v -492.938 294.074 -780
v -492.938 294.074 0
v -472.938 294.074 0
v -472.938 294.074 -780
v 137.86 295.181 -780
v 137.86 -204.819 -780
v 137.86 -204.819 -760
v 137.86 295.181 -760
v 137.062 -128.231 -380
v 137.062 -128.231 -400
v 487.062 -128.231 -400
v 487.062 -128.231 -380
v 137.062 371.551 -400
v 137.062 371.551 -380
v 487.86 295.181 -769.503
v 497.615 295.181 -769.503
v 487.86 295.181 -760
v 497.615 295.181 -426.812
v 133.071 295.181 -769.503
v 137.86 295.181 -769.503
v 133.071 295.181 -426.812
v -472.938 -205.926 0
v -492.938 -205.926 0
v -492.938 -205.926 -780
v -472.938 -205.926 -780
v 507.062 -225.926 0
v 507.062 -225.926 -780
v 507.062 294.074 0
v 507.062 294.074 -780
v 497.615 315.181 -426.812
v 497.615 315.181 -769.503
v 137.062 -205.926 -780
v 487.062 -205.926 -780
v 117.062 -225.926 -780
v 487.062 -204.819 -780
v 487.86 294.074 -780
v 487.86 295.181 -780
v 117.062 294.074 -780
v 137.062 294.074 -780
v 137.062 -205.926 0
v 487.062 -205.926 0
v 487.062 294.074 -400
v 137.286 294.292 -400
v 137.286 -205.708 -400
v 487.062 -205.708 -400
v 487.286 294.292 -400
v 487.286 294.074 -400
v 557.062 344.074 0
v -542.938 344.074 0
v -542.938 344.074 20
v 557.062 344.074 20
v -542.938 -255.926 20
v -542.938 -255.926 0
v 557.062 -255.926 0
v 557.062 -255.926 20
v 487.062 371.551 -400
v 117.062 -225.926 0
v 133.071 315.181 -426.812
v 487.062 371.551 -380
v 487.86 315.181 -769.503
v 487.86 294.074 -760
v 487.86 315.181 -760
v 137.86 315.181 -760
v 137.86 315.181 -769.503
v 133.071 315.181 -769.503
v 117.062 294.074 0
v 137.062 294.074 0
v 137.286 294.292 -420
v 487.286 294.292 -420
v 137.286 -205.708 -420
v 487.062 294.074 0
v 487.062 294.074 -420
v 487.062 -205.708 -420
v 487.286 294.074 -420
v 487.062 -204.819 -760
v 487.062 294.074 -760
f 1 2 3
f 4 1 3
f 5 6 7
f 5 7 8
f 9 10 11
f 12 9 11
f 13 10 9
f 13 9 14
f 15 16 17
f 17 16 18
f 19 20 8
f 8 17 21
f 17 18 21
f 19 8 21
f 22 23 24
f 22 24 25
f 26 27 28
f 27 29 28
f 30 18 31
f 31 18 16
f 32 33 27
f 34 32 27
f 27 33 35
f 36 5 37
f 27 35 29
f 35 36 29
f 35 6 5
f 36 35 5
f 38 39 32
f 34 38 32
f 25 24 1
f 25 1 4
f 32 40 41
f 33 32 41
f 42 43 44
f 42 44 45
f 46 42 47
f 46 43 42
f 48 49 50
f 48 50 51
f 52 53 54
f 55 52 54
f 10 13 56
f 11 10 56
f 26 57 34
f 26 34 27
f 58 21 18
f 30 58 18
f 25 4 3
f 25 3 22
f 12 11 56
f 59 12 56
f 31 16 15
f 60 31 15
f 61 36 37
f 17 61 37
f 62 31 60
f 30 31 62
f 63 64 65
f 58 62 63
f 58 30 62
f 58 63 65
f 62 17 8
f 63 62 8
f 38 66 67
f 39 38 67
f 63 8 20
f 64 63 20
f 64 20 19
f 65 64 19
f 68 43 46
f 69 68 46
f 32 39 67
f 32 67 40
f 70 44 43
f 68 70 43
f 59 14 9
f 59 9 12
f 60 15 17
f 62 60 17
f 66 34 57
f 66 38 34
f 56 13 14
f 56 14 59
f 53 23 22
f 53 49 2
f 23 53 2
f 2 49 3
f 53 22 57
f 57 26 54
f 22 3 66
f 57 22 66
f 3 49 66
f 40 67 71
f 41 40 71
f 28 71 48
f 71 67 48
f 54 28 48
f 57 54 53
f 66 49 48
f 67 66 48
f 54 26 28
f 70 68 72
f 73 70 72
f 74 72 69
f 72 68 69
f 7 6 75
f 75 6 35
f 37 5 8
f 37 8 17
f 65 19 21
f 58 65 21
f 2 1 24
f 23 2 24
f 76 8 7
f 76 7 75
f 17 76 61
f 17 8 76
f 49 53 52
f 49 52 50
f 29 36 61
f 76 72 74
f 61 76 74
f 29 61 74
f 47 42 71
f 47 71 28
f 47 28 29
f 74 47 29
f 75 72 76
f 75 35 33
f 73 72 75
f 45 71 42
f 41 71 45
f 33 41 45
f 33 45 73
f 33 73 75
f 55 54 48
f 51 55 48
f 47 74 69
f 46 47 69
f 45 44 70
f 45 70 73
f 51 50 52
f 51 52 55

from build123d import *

# Parameters (mm, degrees)
F0_W      = 1100
F0_H      = 600
F1_DEPTH  = 20
F2_W      = 20
F2_H      = 500
F3_DEPTH  = 780
F4_W      = 390
F4_H      = 780
F5_DEPTH  = 20
F7_W      = 350
F7_H      = 500
F8_DEPTH  = 20
F10_W     = 350
F10_H     = 499.781407
F11_DEPTH = 20
F12_W     = 350
F12_H     = 500
F13_DEPTH = 20
F15_DEPTH = 20


with BuildPart() as f1:
    # F0 (on Top) → F1 (new body)
    with BuildSketch(Plane.XY):
        with Locations((7.06239, 44.073685)):
            Rectangle(F0_W, F0_H)
    extrude(amount=F1_DEPTH)

    # F2 (on face) → F3 (join)
    with BuildSketch(Plane(origin=(0, 0, 0), x_dir=(1, 0, 0), z_dir=(0, 0, -1))):
        with Locations((-482.93761, -44.073685)):
            Rectangle(F2_W, F2_H)
        with Locations((497.06239, -44.073671)):
            Rectangle(F2_W, F2_H)
        with Locations((127.06239, -44.073671)):
            Rectangle(F2_W, F2_H)
    extrude(amount=F3_DEPTH)

    # F4 (on face) → F5 (join)
    with BuildSketch(Plane.XZ.offset(205.926329)):
        with Locations((312.06239, -390)):
            Rectangle(F4_W, F4_H)
    extrude(amount=F5_DEPTH)

    # F7 (on offset) → F8 (join)
    with BuildSketch(Plane.XY.offset(-400)):
        with Locations((312.28637, 44.292264)):
            Rectangle(F7_W, F7_H)
    extrude(amount=-F8_DEPTH)

    # F12 (on offset) → F13 (join)
    with BuildSketch(Plane.XY.offset(-780)):
        with Locations((312.859863, 45.180604)):
            Rectangle(F12_W, F12_H)
    extrude(amount=F13_DEPTH)


with BuildPart() as f11:
    # F10 (on offset) → F11 (new body)
    with BuildSketch(Plane.XY.offset(-400)):
        with Locations((312.06239, 121.660056)):
            Rectangle(F10_W, F10_H)
    extrude(amount=F11_DEPTH)


with BuildPart() as f15:
    # F14 (on face) → F15 (new body)
    with BuildSketch(Plane(origin=(0, 295.180604, 0), x_dir=(-1, 0, 0), z_dir=(0, 1, 0))):
        Polygon((-497.615308, -426.811755), (-497.615308, -769.503295), (-487.859863, -769.503295), (-487.859863, -760), (-137.859863, -760), (-137.859863, -769.503295), (-133.070961, -769.503295), (-133.070961, -426.811755), align=None)
    extrude(amount=F15_DEPTH)


solid = Compound([f1.part, f11.part, f15.part])
